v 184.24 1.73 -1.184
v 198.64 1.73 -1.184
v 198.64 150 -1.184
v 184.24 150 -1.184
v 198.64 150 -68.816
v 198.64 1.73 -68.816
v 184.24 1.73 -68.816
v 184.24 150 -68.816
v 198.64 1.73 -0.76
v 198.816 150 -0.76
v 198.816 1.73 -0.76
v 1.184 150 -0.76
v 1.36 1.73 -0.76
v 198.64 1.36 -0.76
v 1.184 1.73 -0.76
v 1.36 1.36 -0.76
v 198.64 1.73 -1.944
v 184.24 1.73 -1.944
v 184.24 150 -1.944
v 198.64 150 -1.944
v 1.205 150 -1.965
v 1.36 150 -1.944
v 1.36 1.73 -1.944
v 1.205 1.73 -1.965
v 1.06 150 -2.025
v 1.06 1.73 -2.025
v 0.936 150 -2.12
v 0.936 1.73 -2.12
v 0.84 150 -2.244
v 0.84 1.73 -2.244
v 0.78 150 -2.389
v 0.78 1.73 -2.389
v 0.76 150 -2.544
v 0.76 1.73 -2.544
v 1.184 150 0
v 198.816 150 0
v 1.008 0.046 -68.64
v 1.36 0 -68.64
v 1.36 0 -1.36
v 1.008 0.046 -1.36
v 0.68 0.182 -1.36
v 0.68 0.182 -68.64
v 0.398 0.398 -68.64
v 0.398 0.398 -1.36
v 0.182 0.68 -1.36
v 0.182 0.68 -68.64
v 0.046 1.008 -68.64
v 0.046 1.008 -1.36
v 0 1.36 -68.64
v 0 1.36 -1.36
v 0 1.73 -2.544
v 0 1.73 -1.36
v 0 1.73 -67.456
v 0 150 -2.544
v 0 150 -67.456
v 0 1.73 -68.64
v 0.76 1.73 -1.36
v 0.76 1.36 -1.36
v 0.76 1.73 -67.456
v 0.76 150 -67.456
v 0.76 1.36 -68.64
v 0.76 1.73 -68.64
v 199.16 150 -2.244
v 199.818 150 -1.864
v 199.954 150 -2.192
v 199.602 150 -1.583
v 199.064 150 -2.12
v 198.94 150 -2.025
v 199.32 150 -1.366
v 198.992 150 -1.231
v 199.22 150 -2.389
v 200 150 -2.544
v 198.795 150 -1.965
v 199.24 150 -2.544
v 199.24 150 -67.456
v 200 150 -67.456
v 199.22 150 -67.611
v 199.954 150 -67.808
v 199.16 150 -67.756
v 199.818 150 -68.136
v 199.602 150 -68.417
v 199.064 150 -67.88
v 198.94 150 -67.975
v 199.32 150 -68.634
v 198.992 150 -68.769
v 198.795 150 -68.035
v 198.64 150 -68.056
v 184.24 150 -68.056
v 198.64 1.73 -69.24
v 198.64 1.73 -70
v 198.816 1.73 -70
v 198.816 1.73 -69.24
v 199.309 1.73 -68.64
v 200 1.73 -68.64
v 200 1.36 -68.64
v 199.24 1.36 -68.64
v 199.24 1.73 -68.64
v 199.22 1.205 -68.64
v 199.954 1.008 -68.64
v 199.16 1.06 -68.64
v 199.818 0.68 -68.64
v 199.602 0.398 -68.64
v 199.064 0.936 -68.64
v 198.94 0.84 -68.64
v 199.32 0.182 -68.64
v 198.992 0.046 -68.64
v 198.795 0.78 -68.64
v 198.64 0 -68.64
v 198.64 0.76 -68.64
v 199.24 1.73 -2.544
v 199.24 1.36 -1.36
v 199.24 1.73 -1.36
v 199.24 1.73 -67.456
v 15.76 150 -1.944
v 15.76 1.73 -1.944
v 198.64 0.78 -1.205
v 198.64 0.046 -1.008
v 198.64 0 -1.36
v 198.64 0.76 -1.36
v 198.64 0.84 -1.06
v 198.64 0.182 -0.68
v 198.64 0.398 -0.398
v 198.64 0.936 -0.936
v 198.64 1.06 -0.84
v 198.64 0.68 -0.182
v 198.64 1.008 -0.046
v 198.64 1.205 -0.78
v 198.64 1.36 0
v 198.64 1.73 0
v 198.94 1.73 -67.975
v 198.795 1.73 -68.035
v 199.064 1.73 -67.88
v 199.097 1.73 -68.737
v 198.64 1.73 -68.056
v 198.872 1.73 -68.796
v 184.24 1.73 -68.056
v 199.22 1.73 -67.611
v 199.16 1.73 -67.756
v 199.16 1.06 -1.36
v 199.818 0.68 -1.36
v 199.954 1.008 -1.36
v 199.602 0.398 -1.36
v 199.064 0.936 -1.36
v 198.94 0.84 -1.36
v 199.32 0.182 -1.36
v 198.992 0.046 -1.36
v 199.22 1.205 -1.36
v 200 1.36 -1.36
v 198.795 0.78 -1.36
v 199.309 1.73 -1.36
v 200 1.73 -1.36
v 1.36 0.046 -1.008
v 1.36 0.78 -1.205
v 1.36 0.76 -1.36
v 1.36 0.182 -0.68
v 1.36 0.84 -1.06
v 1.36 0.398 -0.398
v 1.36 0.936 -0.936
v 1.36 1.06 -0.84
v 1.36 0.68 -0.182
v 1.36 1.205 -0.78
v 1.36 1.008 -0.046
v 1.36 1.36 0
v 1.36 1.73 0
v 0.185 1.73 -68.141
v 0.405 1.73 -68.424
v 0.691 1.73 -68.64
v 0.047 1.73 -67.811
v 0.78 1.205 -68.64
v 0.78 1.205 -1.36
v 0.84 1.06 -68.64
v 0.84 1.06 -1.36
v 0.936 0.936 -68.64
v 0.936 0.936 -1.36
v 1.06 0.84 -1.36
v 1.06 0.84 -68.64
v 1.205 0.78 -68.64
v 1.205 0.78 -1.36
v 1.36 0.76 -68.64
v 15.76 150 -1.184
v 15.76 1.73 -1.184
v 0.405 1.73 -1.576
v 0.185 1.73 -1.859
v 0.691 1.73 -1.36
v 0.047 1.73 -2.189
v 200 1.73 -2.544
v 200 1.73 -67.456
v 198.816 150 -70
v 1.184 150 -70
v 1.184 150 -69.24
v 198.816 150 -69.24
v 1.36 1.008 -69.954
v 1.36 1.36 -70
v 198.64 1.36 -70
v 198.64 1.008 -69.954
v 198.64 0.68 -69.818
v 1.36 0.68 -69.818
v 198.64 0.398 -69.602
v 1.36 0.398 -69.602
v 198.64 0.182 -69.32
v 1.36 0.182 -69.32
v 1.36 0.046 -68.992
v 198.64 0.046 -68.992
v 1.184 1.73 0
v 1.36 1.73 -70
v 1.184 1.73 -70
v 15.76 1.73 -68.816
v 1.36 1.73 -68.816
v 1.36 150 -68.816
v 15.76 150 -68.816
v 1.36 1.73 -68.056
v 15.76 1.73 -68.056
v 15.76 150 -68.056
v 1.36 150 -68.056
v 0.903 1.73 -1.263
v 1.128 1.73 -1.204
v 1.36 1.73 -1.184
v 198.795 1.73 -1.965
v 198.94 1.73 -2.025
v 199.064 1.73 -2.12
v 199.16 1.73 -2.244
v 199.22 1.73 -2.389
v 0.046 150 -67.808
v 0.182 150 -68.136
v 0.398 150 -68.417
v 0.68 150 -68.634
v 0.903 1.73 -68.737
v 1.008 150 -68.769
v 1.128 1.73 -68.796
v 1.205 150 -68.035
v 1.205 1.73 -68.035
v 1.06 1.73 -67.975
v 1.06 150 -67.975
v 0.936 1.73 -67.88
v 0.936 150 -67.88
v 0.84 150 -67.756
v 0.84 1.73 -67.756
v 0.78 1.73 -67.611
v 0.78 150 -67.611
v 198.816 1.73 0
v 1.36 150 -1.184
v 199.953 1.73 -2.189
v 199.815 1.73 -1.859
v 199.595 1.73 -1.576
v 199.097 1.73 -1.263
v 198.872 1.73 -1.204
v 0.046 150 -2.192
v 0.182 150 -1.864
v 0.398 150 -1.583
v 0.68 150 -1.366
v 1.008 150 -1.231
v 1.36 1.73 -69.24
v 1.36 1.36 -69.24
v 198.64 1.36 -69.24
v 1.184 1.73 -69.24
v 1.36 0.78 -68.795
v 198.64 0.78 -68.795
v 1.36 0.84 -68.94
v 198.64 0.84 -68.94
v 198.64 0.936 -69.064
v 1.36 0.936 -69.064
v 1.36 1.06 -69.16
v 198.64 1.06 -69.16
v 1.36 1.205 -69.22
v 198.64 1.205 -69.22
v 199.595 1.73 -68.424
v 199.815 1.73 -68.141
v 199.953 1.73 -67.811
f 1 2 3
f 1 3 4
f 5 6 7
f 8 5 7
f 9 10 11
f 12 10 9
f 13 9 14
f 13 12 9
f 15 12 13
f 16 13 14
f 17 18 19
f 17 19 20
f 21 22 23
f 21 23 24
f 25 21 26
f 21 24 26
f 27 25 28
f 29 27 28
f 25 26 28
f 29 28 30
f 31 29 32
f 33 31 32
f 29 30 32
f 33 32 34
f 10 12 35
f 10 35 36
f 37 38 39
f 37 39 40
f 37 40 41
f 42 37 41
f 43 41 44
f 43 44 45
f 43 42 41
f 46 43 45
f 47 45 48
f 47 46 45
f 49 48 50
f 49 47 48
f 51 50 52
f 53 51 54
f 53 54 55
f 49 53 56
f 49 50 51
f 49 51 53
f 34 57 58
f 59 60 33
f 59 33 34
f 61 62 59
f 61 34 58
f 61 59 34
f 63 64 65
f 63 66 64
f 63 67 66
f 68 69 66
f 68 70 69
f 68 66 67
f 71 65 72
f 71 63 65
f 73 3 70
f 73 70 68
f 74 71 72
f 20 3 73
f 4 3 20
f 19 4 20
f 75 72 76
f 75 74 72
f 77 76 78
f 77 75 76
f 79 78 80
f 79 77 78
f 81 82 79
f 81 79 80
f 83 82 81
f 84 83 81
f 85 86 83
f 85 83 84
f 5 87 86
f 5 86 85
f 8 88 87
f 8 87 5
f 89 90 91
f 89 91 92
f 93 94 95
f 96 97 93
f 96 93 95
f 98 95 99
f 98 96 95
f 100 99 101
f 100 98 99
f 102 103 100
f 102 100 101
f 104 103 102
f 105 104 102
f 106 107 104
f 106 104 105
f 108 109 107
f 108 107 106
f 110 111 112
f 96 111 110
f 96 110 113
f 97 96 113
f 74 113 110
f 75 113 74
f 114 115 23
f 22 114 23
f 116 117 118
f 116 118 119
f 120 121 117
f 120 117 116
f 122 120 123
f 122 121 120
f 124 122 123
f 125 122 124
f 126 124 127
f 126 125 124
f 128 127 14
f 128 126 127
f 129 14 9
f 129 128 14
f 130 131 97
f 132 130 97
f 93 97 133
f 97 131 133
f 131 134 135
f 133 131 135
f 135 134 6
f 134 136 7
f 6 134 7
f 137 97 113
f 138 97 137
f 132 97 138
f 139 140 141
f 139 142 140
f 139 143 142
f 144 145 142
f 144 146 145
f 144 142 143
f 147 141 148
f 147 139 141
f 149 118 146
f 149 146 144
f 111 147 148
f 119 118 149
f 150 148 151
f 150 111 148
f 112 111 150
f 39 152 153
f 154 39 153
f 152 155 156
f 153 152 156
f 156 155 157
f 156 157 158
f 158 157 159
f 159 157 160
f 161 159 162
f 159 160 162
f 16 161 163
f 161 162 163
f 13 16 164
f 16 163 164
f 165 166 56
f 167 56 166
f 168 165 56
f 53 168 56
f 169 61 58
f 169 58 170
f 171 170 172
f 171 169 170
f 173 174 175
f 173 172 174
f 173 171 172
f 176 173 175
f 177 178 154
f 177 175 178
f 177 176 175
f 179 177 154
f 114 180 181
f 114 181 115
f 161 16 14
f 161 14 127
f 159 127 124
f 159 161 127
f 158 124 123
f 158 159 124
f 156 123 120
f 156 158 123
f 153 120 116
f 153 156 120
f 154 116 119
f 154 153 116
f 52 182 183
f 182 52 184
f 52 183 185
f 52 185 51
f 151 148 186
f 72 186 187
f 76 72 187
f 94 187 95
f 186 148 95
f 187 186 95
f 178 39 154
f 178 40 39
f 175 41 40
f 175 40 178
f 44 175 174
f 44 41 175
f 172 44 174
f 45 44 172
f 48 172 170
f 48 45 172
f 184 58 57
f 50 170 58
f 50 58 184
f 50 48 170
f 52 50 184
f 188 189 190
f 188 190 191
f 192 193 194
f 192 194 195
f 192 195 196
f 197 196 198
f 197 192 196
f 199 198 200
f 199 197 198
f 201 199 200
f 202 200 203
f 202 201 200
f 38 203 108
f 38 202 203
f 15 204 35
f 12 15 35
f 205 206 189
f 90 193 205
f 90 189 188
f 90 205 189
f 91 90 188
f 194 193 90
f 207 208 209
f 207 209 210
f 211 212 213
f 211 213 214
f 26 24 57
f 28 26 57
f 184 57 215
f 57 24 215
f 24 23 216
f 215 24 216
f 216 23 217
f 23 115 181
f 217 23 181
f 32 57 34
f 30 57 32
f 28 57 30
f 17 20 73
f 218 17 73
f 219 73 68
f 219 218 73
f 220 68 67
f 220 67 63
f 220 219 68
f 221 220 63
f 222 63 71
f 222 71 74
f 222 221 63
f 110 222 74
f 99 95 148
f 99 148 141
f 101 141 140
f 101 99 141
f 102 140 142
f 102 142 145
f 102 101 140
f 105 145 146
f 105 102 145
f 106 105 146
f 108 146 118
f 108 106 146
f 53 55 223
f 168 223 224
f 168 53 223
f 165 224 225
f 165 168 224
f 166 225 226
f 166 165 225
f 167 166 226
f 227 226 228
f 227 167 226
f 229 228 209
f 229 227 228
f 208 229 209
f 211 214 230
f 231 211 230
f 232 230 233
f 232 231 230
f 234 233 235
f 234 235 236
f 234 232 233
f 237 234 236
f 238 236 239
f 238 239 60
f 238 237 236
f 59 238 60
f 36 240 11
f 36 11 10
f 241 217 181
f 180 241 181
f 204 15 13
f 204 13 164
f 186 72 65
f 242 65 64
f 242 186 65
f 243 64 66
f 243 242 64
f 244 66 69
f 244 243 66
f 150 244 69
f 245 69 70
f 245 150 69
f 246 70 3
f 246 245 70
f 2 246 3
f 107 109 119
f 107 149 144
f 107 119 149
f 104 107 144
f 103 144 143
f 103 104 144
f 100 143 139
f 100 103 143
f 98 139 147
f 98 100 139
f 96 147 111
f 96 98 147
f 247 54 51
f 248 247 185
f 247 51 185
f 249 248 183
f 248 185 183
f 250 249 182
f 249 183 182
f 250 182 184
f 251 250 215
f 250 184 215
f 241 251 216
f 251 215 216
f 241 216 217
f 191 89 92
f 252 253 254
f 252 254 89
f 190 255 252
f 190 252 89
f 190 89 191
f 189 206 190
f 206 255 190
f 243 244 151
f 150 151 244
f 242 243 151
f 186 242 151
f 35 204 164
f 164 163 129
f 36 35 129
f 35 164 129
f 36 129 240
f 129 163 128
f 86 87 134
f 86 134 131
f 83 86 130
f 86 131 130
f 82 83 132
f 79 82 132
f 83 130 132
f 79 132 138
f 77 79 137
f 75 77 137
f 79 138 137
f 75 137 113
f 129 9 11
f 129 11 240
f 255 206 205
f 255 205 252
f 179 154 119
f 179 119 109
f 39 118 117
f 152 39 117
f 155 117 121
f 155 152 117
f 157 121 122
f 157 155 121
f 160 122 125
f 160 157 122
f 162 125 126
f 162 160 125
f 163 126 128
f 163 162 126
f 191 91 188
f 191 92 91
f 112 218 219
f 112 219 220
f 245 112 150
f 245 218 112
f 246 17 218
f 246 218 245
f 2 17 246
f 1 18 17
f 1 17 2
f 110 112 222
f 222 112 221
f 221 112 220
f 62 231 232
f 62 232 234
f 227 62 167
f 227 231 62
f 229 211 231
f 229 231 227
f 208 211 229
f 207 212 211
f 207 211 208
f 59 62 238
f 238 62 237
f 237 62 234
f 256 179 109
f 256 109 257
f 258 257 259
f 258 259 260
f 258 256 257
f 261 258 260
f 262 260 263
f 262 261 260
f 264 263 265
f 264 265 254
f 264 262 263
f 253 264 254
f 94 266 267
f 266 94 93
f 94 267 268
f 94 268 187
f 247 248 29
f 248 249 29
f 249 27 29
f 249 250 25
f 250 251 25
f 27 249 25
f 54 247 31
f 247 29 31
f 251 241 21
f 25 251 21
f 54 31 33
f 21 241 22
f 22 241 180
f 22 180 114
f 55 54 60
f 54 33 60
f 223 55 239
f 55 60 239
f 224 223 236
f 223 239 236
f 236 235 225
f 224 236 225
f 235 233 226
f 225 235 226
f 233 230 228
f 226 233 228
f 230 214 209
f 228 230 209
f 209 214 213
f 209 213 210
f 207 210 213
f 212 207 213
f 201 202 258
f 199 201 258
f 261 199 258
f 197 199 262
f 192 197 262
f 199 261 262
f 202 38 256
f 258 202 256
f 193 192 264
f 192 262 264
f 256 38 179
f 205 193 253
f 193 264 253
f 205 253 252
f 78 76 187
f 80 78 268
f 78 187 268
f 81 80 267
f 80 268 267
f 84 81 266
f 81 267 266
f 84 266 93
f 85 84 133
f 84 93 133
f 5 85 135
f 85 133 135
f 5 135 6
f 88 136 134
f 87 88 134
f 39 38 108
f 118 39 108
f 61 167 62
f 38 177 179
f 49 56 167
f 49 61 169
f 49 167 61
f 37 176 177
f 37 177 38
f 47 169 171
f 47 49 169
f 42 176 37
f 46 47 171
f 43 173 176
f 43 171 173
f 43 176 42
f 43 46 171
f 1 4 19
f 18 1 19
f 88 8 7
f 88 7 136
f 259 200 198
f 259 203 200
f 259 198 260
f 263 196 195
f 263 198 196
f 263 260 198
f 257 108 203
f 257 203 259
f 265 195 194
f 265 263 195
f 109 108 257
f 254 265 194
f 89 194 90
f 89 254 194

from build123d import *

# Parameters (mm, degrees)
SKETCH1_W                    = 200
SKETCH1_H                    = 70
BOSS_EXTRUDE1_DEPTH          = 150
CONVERT_SOLID1_START         = 1.36
CONVERT_SOLID1_DEPTH         = 197.28
CONVERT_SOLID1_START_2       = -1
CONVERT_SOLID1_2_DEPTH       = 202
CONVERT_SOLID1_3_DEPTH       = 2.184264069
CONVERT_SOLID1_START_3       = 198.815735931
CONVERT_SOLID1_4_DEPTH       = 2.184264069
CONVERT_SOLID1_START_4       = 1.184264069
CONVERT_SOLID1_5_DEPTH       = 197.631471862
CONVERT_SOLID1_6_DEPTH       = 0.175735931
CONVERT_SOLID1_START_5       = 198.64
CONVERT_SOLID1_7_DEPTH       = 0.175735931
CONVERT_SOLID1_START_6       = -68.815735931
CONVERT_SOLID1_8_DEPTH       = 67.631471862
CONVERT_SOLID1_9_DEPTH       = 0.175735931
CONVERT_SOLID1_START_7       = -1.36
CONVERT_SOLID1_10_DEPTH      = 0.175735931
EDGE_FLANGE1_STRIP_W         = 4.24
EDGE_FLANGE1_STRIP_H         = 0.76
EDGE_FLANGE1_STRIP_CUT_DEPTH = 148.269865
EDGE_FLANGE1_DEPTH           = 148.269865
MIRROR2_COPY_1_SKETCH_W      = 4.24
MIRROR2_COPY_1_SKETCH_H      = 0.76
MIRROR2_COPY_1_DEPTH         = 148.269865
MIRROR2_COPY_2_DEPTH         = 148.269865


with BuildPart() as part:
    # Sketch1 → Boss-Extrude1 (new body)
    with BuildSketch(Plane(origin=(0, 0, 0), x_dir=(1, 0, 0), z_dir=(0, 1, 0))):
        with Locations((100, 35)):
            Rectangle(SKETCH1_W, SKETCH1_H)
    extrude(amount=BOSS_EXTRUDE1_DEPTH)

    # Convert-Solid1: read off the stored shape, not the designer's step
    # Convert-Solid1 outline → Convert-Solid1 (cut)
    with BuildSketch(Plane.YZ.offset(CONVERT_SOLID1_START)):
        with BuildLine():
            Line((150, -0.76), (1.36, -0.76))
            ThreePointArc((1.36, -0.76), (0.935735931, -0.935735931), (0.76, -1.36))
            Line((0.76, -1.36), (0.76, -68.64))
            ThreePointArc((0.76, -68.64), (0.935735931, -69.064264069), (1.36, -69.24))
            Line((1.36, -69.24), (150, -69.24))
            Line((150, -69.24), (150, -0.76))
        make_face()
    extrude(amount=CONVERT_SOLID1_DEPTH, mode=Mode.SUBTRACT)

    # Convert-Solid1 2 outline → Convert-Solid1 2 (cut)
    with BuildSketch(Plane.YZ.offset(CONVERT_SOLID1_START_2)):
        with BuildLine():
            Line((0.76, -1.36), (1.730135, -1.36))
            Line((1.730135, -1.36), (1.730135, -1.184264069))
            Line((1.730135, -1.184264069), (150, -1.184264069))
            Line((150, -1.184264069), (150, -0.76))
            Line((150, -0.76), (1.36, -0.76))
            ThreePointArc((1.36, -0.76), (0.935735931, -0.935735931), (0.76, -1.36))
        make_face()
        with BuildLine():
            Line((1.730135, -68.64), (0.76, -68.64))
            ThreePointArc((0.76, -68.64), (0.935735931, -69.064264069), (1.36, -69.24))
            Line((1.36, -69.24), (150, -69.24))
            Line((150, -69.24), (150, -68.815735931))
            Line((150, -68.815735931), (1.730135, -68.815735931))
            Line((1.730135, -68.815735931), (1.730135, -68.64))
        make_face()
    extrude(amount=CONVERT_SOLID1_2_DEPTH, mode=Mode.SUBTRACT)

    # Convert-Solid1 3 outline → Convert-Solid1 3 (cut)
    with BuildSketch(Plane.YZ.offset(CONVERT_SOLID1_START_2)):
        with BuildLine():
            Line((150, -69.24), (1.36, -69.24))
            ThreePointArc((1.36, -69.24), (0.935735931, -69.064264069), (0.76, -68.64))
            Line((0.76, -68.64), (0, -68.64))
            Line((0, -68.64), (0, -70))
            Line((0, -70), (150, -70))
            Line((150, -70), (150, -69.24))
        make_face()
        with BuildLine():
            Line((0, 0), (0, -1.36))
            Line((0, -1.36), (0.76, -1.36))
            ThreePointArc((0.76, -1.36), (0.935735931, -0.935735931), (1.36, -0.76))
            Line((1.36, -0.76), (150, -0.76))
            Line((150, -0.76), (150, 0))
            Line((150, 0), (0, 0))
        make_face()
    extrude(amount=CONVERT_SOLID1_3_DEPTH, mode=Mode.SUBTRACT)

    # Convert-Solid1 4 outline → Convert-Solid1 4 (cut)
    with BuildSketch(Plane.YZ.offset(CONVERT_SOLID1_START_3)):
        with BuildLine():
            Line((150, -69.24), (1.36, -69.24))
            ThreePointArc((1.36, -69.24), (0.935735931, -69.064264069), (0.76, -68.64))
            Line((0.76, -68.64), (0, -68.64))
            Line((0, -68.64), (0, -70))
            Line((0, -70), (150, -70))
            Line((150, -70), (150, -69.24))
        make_face()
        with BuildLine():
            Line((0, 0), (0, -1.36))
            Line((0, -1.36), (0.76, -1.36))
            ThreePointArc((0.76, -1.36), (0.935735931, -0.935735931), (1.36, -0.76))
            Line((1.36, -0.76), (150, -0.76))
            Line((150, -0.76), (150, 0))
            Line((150, 0), (0, 0))
        make_face()
    extrude(amount=CONVERT_SOLID1_4_DEPTH, mode=Mode.SUBTRACT)

    # Convert-Solid1 5 outline → Convert-Solid1 5 (cut)
    with BuildSketch(Plane.YZ.offset(CONVERT_SOLID1_START_4)):
        with BuildLine():
            Line((0, -70), (1.36, -70))
            ThreePointArc((1.36, -70), (0.398334778, -69.601665222), (0, -68.64))
            Line((0, -68.64), (0, -70))
        make_face()
        with BuildLine():
            Line((0, 0), (0, -1.36))
            ThreePointArc((0, -1.36), (0.398334778, -0.398334778), (1.36, 0))
            Line((1.36, 0), (0, 0))
        make_face()
    extrude(amount=CONVERT_SOLID1_5_DEPTH, mode=Mode.SUBTRACT)

    # Convert-Solid1 6 outline → Convert-Solid1 6 (cut)
    with BuildSketch(Plane.YZ.offset(CONVERT_SOLID1_START_4)):
        with BuildLine():
            Line((1.730135, -70), (1.730135, -69.24))
            Line((1.730135, -69.24), (1.36, -69.24))
            ThreePointArc((1.36, -69.24), (0.935735931, -69.064264069), (0.76, -68.64))
            Line((0.76, -68.64), (0, -68.64))
            ThreePointArc((0, -68.64), (0.398334778, -69.601665222), (1.36, -70))
            Line((1.36, -70), (1.730135, -70))
        make_face()
        with BuildLine():
            ThreePointArc((1.36, 0), (0.398334778, -0.398334778), (0, -1.36))
            Line((0, -1.36), (0.76, -1.36))
            ThreePointArc((0.76, -1.36), (0.935735931, -0.935735931), (1.36, -0.76))
            Line((1.36, -0.76), (1.730135, -0.76))
            Line((1.730135, -0.76), (1.730135, 0))
            Line((1.730135, 0), (1.36, 0))
        make_face()
    extrude(amount=CONVERT_SOLID1_6_DEPTH, mode=Mode.SUBTRACT)

    # Convert-Solid1 7 outline → Convert-Solid1 7 (cut)
    with BuildSketch(Plane.YZ.offset(CONVERT_SOLID1_START_5)):
        with BuildLine():
            Line((1.730135, -70), (1.730135, -69.24))
            Line((1.730135, -69.24), (1.36, -69.24))
            ThreePointArc((1.36, -69.24), (0.935735931, -69.064264069), (0.76, -68.64))
            Line((0.76, -68.64), (0, -68.64))
            ThreePointArc((0, -68.64), (0.398334778, -69.601665222), (1.36, -70))
            Line((1.36, -70), (1.730135, -70))
        make_face()
        with BuildLine():
            ThreePointArc((1.36, 0), (0.398334778, -0.398334778), (0, -1.36))
            Line((0, -1.36), (0.76, -1.36))
            ThreePointArc((0.76, -1.36), (0.935735931, -0.935735931), (1.36, -0.76))
            Line((1.36, -0.76), (1.730135, -0.76))
            Line((1.730135, -0.76), (1.730135, 0))
            Line((1.730135, 0), (1.36, 0))
        make_face()
    extrude(amount=CONVERT_SOLID1_7_DEPTH, mode=Mode.SUBTRACT)

    # Convert-Solid1 8 outline → Convert-Solid1 8 (cut)
    with BuildSketch(Plane.XY.offset(CONVERT_SOLID1_START_6)):
        with BuildLine():
            Line((0, 0), (1.36, 0))
            ThreePointArc((1.36, 0), (0.398334778, 0.398334778), (0, 1.36))
            Line((0, 1.36), (0, 0))
        make_face()
        with BuildLine():
            ThreePointArc((200, 1.36), (199.601665222, 0.398334778), (198.64, 0))
            Line((198.64, 0), (200, 0))
            Line((200, 0), (200, 1.36))
        make_face()
        with BuildLine():
            ThreePointArc((0.76, 1.36), (0.935735931, 0.935735931), (1.36, 0.76))
            Line((1.36, 0.76), (1.36, 150))
            Line((1.36, 150), (0.76, 150))
            Line((0.76, 150), (0.76, 1.36))
        make_face()
        with BuildLine():
            ThreePointArc((198.64, 0.76), (199.064264069, 0.935735931), (199.24, 1.36))
            Line((199.24, 1.36), (199.24, 150))
            Line((199.24, 150), (198.64, 150))
            Line((198.64, 150), (198.64, 0.76))
        make_face()
    extrude(amount=CONVERT_SOLID1_8_DEPTH, mode=Mode.SUBTRACT)

    # Convert-Solid1 9 outline → Convert-Solid1 9 (cut)
    with BuildSketch(Plane.XY.offset(CONVERT_SOLID1_START_6)):
        with BuildLine():
            ThreePointArc((0, 1.36), (0.398334778, 0.398334778), (1.36, 0))
            Line((1.36, 0), (1.36, 0.76))
            ThreePointArc((1.36, 0.76), (0.935735931, 0.935735931), (0.76, 1.36))
            Line((0.76, 1.36), (0.76, 1.730135))
            Line((0.76, 1.730135), (0, 1.730135))
            Line((0, 1.730135), (0, 1.36))
        make_face()
        with BuildLine():
            Line((198.64, 0.76), (198.64, 0))
            ThreePointArc((198.64, 0), (199.601665222, 0.398334778), (200, 1.36))
            Line((200, 1.36), (200, 1.730135))
            Line((200, 1.730135), (199.24, 1.730135))
            Line((199.24, 1.730135), (199.24, 1.36))
            ThreePointArc((199.24, 1.36), (199.064264069, 0.935735931), (198.64, 0.76))
        make_face()
    extrude(amount=CONVERT_SOLID1_9_DEPTH, mode=Mode.SUBTRACT)

    # Convert-Solid1 10 outline → Convert-Solid1 10 (cut)
    with BuildSketch(Plane.XY.offset(CONVERT_SOLID1_START_7)):
        with BuildLine():
            ThreePointArc((0, 1.36), (0.398334778, 0.398334778), (1.36, 0))
            Line((1.36, 0), (1.36, 0.76))
            ThreePointArc((1.36, 0.76), (0.935735931, 0.935735931), (0.76, 1.36))
            Line((0.76, 1.36), (0.76, 1.730135))
            Line((0.76, 1.730135), (0, 1.730135))
            Line((0, 1.730135), (0, 1.36))
        make_face()
        with BuildLine():
            Line((198.64, 0.76), (198.64, 0))
            ThreePointArc((198.64, 0), (199.601665222, 0.398334778), (200, 1.36))
            Line((200, 1.36), (200, 1.730135))
            Line((200, 1.730135), (199.24, 1.730135))
            Line((199.24, 1.730135), (199.24, 1.36))
            ThreePointArc((199.24, 1.36), (199.064264069, 0.935735931), (198.64, 0.76))
        make_face()
    extrude(amount=CONVERT_SOLID1_10_DEPTH, mode=Mode.SUBTRACT)

    # Edge-Flange1: sheet metal written as solids
    # Edge-Flange1 strip (on a plane across the edge) → Edge-Flange1 strip cut (cut)
    with BuildSketch(Plane(origin=(199.24, 1.730135, -1.184264069), x_dir=(0, 0, -1), z_dir=(0, 1, 0))):
        with Locations((-0.76, -0.38)):
            Rectangle(EDGE_FLANGE1_STRIP_W, EDGE_FLANGE1_STRIP_H)
    edge_flange1_strip_cut = extrude(amount=EDGE_FLANGE1_STRIP_CUT_DEPTH, mode=Mode.SUBTRACT)

    # Edge-Flange1 section (on a plane across the edge) → Edge-Flange1 (add)
    with BuildSketch(Plane(origin=(199.24, 1.730135, -1.184264069), x_dir=(0, 0, -1), z_dir=(0, 1, 0))):
        with BuildLine():
            Line((0, 0.6), (0, 15))
            Line((0, 15), (0.76, 15))
            Line((0.76, 15), (0.76, 0.6))
            ThreePointArc((0.76, 0.6), (0.935735931, 0.175735931), (1.36, 0))
            Line((1.36, 0), (1.36, -0.76))
            ThreePointArc((1.36, -0.76), (0.398334778, -0.361665222), (0, 0.6))
        make_face()
    edge_flange1 = extrude(amount=EDGE_FLANGE1_DEPTH)

    # Mirror1: Edge-Flange1 strip cut, Edge-Flange1 across plane
    add(edge_flange1_strip_cut.mirror(Plane(origin=(100, 0, 0), x_dir=(0, 0, 1), z_dir=(1, 0, 0))), mode=Mode.SUBTRACT)
    add(edge_flange1.mirror(Plane(origin=(100, 0, 0), x_dir=(0, 0, 1), z_dir=(1, 0, 0))))

    # Mirror2: Edge-Flange1 strip cut, Edge-Flange1 across plane
    add(edge_flange1_strip_cut.mirror(Plane.XY.offset(-35)), mode=Mode.SUBTRACT)
    add(edge_flange1.mirror(Plane.XY.offset(-35)))

    # Mirror2 copy 1 sketch → Mirror2 copy 1 (cut)
    with BuildSketch(Plane(origin=(0.76, 1.730135, -68.815735931), x_dir=(0, 0, 1), z_dir=(0, 1, 0))):
        with Locations((-0.76, -0.38)):
            Rectangle(MIRROR2_COPY_1_SKETCH_W, MIRROR2_COPY_1_SKETCH_H)
    extrude(amount=MIRROR2_COPY_1_DEPTH, mode=Mode.SUBTRACT)

    # Mirror2 copy 2 sketch → Mirror2 copy 2 (add)
    with BuildSketch(Plane(origin=(0.76, 1.730135, -68.815735931), x_dir=(0, 0, 1), z_dir=(0, 1, 0))):
        with BuildLine():
            Line((0, 0.6), (0, 15))
            Line((0, 15), (0.76, 15))
            Line((0.76, 15), (0.76, 0.6))
            ThreePointArc((0.76, 0.6), (0.935735931, 0.175735931), (1.36, 0))
            Line((1.36, 0), (1.36, -0.76))
            ThreePointArc((1.36, -0.76), (0.398334778, -0.361665222), (0, 0.6))
        make_face()
    extrude(amount=MIRROR2_COPY_2_DEPTH)


solid = part.part
